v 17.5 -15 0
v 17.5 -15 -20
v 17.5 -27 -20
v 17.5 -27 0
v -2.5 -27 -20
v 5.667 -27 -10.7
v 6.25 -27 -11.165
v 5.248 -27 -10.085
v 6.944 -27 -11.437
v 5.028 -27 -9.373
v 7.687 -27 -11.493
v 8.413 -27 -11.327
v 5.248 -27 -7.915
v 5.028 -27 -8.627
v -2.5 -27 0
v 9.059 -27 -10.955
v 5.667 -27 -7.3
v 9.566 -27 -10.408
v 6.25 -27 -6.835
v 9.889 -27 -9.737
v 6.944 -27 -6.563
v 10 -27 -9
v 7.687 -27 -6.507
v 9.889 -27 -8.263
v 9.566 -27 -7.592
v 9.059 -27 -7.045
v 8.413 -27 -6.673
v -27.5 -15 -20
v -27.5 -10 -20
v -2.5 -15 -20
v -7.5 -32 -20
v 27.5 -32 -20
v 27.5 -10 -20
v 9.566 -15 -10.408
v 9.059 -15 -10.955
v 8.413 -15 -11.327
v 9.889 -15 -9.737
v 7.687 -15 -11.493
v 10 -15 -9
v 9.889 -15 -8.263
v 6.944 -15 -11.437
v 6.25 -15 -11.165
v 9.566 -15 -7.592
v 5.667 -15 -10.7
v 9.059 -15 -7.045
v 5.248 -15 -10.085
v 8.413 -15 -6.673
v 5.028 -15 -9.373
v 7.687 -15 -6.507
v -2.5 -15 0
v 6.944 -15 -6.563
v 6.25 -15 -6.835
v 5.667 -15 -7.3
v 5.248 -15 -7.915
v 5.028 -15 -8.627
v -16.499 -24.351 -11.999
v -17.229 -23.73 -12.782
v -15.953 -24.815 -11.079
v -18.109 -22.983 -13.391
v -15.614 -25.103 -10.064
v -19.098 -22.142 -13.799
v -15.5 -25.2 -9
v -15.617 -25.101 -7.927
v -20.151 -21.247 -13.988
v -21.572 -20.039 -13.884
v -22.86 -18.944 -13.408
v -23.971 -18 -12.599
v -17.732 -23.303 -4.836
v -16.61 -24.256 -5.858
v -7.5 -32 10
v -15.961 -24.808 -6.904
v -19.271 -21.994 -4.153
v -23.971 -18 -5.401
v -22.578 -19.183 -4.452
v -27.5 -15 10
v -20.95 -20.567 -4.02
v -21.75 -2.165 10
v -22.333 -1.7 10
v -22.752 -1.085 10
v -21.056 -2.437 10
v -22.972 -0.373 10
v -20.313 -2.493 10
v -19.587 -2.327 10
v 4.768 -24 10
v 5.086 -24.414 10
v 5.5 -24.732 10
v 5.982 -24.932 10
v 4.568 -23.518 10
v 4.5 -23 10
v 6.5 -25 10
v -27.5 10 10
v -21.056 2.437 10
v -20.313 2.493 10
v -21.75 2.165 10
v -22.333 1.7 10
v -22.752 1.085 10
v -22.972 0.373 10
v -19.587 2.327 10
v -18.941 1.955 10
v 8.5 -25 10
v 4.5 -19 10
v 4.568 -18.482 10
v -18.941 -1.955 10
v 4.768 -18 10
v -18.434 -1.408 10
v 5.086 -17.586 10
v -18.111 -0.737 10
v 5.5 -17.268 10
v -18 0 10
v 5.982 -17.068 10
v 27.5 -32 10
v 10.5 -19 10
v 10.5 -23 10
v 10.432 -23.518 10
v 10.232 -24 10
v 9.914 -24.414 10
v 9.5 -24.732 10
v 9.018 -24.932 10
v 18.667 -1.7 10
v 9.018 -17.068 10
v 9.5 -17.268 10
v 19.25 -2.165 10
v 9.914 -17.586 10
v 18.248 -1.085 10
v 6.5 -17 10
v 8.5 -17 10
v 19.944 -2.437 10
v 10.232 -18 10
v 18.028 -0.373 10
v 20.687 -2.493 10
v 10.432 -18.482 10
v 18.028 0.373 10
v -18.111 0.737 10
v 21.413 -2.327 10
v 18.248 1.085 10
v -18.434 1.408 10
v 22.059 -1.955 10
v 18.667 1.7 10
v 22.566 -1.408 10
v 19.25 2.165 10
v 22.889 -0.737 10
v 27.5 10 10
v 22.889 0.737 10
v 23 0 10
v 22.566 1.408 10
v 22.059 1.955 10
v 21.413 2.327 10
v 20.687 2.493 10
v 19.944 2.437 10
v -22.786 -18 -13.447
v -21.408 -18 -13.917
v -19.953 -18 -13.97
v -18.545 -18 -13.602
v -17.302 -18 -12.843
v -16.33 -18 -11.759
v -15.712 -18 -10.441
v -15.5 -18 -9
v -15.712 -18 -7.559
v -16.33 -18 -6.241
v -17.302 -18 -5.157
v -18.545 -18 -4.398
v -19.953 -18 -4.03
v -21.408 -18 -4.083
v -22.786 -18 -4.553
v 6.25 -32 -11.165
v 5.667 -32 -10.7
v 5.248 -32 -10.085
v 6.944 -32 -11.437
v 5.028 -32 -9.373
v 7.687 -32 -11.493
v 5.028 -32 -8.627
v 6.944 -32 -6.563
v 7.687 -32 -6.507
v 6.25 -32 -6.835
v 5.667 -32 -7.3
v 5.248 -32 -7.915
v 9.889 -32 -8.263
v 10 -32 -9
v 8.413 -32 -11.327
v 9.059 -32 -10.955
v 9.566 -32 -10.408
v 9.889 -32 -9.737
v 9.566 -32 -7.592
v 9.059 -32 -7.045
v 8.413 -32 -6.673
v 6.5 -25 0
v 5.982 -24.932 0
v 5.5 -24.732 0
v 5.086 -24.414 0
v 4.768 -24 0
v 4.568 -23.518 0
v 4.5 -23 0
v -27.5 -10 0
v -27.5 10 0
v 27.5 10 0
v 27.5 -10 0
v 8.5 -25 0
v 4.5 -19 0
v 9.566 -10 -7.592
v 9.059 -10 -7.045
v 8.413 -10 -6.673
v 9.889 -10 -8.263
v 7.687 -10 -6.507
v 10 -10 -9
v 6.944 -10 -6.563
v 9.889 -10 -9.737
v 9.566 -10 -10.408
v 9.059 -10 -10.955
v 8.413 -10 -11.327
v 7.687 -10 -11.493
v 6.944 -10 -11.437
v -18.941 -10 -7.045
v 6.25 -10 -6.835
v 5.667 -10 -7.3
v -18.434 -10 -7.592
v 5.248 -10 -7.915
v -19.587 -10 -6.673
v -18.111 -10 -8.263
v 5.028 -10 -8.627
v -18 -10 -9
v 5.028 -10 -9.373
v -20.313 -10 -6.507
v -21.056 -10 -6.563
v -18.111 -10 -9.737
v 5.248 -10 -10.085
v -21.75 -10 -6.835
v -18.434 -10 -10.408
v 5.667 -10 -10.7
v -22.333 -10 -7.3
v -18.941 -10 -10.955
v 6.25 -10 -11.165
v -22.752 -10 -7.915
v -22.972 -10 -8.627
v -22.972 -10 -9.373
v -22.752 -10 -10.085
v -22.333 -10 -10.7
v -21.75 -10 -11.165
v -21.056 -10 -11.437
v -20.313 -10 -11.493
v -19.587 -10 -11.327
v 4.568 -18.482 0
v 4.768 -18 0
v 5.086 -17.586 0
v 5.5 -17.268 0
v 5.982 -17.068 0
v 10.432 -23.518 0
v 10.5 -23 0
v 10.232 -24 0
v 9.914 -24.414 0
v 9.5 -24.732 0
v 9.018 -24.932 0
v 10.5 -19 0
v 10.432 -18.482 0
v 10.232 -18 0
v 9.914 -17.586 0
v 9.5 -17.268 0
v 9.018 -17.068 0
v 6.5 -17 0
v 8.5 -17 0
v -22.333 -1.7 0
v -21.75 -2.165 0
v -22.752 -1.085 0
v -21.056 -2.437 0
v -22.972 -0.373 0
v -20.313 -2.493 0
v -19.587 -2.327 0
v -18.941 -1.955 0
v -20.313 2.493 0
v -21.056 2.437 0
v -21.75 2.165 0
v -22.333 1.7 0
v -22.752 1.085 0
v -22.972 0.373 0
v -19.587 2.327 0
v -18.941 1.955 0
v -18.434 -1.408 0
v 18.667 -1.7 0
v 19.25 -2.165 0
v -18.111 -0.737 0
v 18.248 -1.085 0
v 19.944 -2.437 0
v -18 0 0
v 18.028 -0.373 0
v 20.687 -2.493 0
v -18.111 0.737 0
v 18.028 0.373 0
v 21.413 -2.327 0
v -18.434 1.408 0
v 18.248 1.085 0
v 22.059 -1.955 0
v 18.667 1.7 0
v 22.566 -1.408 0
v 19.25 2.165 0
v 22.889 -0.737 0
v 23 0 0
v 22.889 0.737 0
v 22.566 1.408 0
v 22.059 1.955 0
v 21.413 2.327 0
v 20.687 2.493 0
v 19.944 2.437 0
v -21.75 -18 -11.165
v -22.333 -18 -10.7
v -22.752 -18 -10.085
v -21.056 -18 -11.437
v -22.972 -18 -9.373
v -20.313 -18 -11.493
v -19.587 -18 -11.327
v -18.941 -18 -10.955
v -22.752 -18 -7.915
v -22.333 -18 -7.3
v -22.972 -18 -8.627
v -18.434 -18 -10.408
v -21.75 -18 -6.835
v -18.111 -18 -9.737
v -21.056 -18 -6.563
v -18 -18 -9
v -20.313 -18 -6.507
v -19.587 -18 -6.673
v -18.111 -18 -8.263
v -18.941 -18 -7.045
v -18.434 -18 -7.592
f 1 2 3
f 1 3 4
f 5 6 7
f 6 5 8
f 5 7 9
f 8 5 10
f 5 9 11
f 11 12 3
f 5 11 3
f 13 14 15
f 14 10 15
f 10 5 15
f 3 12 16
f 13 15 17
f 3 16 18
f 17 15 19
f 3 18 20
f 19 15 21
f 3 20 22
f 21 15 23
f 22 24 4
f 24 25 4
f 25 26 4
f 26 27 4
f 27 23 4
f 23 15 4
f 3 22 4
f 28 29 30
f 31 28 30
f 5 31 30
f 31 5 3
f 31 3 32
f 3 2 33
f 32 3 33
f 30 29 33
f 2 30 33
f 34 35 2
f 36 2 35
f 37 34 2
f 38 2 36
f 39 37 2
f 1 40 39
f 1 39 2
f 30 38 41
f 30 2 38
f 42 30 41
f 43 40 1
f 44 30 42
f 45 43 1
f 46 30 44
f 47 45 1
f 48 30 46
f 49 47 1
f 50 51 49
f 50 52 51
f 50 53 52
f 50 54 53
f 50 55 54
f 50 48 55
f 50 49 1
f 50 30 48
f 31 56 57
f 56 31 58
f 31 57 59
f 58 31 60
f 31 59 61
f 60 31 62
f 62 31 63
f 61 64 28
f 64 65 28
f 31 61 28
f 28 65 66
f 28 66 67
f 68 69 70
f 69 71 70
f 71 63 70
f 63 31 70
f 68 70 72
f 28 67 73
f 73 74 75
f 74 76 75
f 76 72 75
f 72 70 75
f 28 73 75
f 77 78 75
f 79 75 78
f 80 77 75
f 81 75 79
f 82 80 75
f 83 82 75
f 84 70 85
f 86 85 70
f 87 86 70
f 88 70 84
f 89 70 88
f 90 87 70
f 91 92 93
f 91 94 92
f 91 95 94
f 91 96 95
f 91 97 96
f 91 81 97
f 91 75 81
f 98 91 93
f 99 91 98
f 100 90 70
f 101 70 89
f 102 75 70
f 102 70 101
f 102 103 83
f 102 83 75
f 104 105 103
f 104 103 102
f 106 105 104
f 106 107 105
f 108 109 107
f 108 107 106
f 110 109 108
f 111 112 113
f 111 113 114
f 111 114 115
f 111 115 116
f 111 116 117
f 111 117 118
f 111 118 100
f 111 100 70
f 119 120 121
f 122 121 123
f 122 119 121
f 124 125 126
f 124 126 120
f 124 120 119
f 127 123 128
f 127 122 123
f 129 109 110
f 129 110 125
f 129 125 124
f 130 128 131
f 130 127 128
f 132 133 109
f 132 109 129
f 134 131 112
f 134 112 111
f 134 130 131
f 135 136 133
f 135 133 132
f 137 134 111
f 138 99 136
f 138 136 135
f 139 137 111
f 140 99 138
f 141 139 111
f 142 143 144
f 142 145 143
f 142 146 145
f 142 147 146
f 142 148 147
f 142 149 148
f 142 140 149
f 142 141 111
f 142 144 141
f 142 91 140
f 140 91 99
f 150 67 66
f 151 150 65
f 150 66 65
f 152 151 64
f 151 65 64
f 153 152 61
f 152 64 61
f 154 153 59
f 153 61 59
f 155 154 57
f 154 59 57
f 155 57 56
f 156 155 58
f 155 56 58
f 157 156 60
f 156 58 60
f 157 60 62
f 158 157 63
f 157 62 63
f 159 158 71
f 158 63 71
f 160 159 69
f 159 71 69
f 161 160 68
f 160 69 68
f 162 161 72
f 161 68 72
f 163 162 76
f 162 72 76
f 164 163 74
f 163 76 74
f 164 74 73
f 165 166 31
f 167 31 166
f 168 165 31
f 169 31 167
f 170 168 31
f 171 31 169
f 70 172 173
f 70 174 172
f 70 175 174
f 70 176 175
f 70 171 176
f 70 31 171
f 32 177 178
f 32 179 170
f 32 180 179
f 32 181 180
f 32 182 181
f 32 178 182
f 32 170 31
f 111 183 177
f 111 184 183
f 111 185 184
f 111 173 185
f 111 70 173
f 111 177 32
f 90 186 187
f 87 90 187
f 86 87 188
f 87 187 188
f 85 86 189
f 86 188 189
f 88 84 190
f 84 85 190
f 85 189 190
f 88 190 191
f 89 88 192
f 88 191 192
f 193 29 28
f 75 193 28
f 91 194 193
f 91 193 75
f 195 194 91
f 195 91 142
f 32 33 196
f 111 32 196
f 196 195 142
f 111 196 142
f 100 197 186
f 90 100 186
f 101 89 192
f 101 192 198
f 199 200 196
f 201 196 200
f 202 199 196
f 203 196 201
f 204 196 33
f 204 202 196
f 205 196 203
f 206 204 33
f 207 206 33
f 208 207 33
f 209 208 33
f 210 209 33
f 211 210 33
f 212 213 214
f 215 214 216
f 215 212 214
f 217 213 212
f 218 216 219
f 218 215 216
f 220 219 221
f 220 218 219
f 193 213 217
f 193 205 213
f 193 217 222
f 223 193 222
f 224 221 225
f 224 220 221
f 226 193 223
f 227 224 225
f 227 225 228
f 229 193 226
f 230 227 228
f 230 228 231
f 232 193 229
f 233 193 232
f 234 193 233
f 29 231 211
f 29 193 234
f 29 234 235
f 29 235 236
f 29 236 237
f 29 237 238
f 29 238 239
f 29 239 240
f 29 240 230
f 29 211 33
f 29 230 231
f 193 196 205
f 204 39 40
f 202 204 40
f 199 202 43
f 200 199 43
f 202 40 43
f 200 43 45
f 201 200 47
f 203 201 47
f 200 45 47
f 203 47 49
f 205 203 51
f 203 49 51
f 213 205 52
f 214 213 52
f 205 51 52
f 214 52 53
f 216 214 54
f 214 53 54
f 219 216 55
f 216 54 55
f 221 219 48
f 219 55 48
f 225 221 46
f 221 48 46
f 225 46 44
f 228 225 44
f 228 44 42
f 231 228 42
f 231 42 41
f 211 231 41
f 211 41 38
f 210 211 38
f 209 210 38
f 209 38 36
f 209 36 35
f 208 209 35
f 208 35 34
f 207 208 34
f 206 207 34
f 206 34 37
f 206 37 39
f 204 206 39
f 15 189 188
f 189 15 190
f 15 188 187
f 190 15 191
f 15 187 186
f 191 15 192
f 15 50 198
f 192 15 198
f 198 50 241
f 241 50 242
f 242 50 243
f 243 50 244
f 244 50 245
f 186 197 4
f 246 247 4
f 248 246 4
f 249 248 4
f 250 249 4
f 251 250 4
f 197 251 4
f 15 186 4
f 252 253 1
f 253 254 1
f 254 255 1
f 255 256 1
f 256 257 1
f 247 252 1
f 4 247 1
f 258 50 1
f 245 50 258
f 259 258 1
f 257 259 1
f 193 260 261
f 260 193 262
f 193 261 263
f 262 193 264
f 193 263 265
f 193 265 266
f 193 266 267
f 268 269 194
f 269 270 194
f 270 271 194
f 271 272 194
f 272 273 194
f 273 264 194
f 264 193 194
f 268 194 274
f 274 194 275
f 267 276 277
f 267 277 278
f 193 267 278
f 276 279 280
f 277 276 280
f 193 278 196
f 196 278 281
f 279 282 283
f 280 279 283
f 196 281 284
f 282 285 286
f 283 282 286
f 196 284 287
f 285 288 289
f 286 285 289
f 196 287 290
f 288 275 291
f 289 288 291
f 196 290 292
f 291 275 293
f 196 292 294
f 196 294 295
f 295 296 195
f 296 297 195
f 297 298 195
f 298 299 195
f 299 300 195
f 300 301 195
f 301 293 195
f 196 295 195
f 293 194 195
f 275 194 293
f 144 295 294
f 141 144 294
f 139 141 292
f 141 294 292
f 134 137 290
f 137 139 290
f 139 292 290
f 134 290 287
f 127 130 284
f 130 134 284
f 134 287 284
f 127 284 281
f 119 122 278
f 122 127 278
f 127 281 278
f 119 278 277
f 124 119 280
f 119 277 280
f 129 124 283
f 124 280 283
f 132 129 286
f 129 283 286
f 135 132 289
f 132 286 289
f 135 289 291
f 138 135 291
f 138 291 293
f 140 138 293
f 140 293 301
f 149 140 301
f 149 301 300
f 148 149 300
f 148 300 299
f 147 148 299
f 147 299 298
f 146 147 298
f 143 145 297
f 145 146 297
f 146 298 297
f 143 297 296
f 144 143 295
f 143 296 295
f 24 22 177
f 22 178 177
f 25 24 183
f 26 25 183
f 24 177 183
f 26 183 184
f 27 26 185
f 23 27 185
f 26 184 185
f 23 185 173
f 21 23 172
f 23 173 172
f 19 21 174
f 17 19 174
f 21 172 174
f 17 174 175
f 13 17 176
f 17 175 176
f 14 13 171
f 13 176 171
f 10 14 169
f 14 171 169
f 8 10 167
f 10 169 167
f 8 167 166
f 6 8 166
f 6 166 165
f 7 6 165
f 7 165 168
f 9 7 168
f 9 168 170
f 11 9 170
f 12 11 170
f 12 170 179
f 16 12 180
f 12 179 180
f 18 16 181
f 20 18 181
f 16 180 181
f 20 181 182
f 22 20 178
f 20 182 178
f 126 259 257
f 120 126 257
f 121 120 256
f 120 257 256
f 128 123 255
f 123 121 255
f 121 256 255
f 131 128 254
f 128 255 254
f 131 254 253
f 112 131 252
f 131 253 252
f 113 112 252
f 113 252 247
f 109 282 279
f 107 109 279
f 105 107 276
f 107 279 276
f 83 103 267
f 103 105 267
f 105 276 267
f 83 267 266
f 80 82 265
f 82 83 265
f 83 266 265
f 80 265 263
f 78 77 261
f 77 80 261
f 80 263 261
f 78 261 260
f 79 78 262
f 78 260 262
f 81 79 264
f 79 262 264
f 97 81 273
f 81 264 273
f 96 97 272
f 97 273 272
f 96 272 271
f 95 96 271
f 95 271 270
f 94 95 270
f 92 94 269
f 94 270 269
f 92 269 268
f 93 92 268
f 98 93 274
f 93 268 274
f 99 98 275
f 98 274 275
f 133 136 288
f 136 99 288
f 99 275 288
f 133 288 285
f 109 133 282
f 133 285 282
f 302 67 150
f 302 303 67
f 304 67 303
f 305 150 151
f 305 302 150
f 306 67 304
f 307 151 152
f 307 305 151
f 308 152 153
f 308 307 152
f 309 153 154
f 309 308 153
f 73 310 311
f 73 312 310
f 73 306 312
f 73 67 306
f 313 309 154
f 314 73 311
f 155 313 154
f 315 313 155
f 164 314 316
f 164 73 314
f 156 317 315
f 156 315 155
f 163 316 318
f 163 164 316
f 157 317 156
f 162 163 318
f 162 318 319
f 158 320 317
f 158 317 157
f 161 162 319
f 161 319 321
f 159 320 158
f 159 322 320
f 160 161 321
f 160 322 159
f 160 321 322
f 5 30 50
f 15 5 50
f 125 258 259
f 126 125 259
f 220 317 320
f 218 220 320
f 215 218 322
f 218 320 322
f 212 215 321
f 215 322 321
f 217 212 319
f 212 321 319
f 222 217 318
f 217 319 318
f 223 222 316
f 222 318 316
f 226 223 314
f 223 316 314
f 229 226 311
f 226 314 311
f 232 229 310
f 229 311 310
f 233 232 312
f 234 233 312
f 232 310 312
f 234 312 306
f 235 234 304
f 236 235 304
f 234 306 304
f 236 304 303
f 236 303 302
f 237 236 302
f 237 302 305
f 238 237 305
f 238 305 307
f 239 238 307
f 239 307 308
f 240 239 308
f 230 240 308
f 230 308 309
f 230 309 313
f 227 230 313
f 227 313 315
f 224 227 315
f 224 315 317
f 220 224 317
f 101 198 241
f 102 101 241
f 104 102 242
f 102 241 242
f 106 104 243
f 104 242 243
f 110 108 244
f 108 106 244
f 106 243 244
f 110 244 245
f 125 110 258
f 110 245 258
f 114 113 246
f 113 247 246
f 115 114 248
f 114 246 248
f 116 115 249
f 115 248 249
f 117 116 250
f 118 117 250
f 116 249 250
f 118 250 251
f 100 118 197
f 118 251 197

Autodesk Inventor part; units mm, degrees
ref_plane "YZ Plane" through (0, 0, 0) normal (1, 0, 0) x (0, 1, 0)
ref_plane "XZ Plane" through (0, 0, 0) normal (0, 1, 0) x (-1, 0, 0)
ref_plane "XY Plane" through (0, 0, 0) normal (0, 0, 1) x (1, 0, 0)
sketch "Boceto1" plane through (0, 0, 0) normal (0, 0, 1) x (1, 0, 0)
  line L0 (-27.5, 10) -> (27.5, 10)
  line L1 (27.5, 10) -> (27.5, -10)
  line L2 (27.5, -10) -> (-27.5, -10)
  line L3 (-27.5, -10) -> (-27.5, 10)
  line L4 (0, 0) -> (0, 1.7227)
  line L5 (0, 0) -> (-2.1619, 0)
  line L6 (27.5, -10) -> (-2.5, -10)
  line L7 (-2.5, -10) -> (-2.5, -27)
  line L8 (-2.5, -27) -> (27.5, -27)
  line L9 (27.5, -27) -> (27.5, -10)
  circle A0 centre (20.5, 0) radius 2.5
  circle A1 centre (-20.5, 0) radius 2.5
  point P0 (-2.5, -10)
  dimension "d14" = 55
  dimension "d15" = 20
  dimension "d16" = 30
  dimension "d17" = 17
  dimension "d18" = 5
  dimension "d19" = 5
  dimension "d20" = 7
  dimension "d21" = 7
extrude "Extrusión1" add sketch "Boceto1" along normal blind 10
sketch "Boceto2" plane through (-2.5, -27, 0) normal (0, -1, 0) x (1, 0, 0)
  line L0 (30, 10) -> (-25, 10) projected
  line L1 (30, 10) -> (0, 10)
  line L2 (0, 10) -> (0, -20)
  line L3 (0, -20) -> (30, -20)
  line L4 (30, -20) -> (30, 10)
  line L5 (0, 0) -> (0, 10) projected
  point P0 (2.5, 0)
  point P1 (0, 10)
  dimension "d22" = 30
extrude "Extrusión2" add sketch "Boceto2" along normal blind 5
sketch "Boceto4" plane through (-27.5, -10, 0) normal (-1, 0, 0) x (0, 0, 1)
  line L0 (0, 0) -> (0, -17) projected
  line L1 (10, 20) -> (10, 0) projected
  line L2 (10, 0) -> (-20, 0)
  line L3 (-20, 0) -> (-20, -5)
  line L4 (-20, -5) -> (10, -5)
  line L5 (10, -5) -> (10, 0)
  line L6 (10, -22) -> (-20, -22) projected
  point P0 (0, 10)
  dimension "d32" = 5
  dimension "d43" = 30
  dimension "d44" = 30
extrude "Extrusión4" add sketch "Boceto4" against normal up to surface (55 mm away)
sketch "Boceto5" plane through (-2.5, -32, 0) normal (0, -1, 0) x (1, 0, 0)
  circle A0 centre (10, -9) radius 2.5
  line L0 (30, -20) -> (30, 10) projected
  line L1 (0, -20) -> (30, -20) projected
  line L2 (-25, -20) -> (30, -20) projected
  line L3 (-25, -20) -> (-25, 10) projected
  line L4 (-25, 0) -> (30, 0) projected
  point P0 (2.5, 0)
  point P1 (0, 0)
  dimension "d33" = 5
  dimension "d34" = 20
  dimension "d41" = 9
extrude "Extrusión5" cut sketch "Boceto5" against normal up to surface (22 mm away) contours A0
sketch "Boceto8" plane through (-27.5, -15, -20) normal (0, -1, 0) x (1, 0, 0)
  line L0 (0, 30) -> (25, 30) projected
  line L1 (0, 0) -> (55, 0) projected
  line L2 (25, 30) -> (20, 30)
  line L3 (20, 30) -> (20, 0)
  line L4 (20, 0) -> (25, 0)
  line L5 (25, 0) -> (25, 30)
  line L6 (25, 20) -> (55, 20) projected
  line L7 (45, 20) -> (55, 20)
  line L8 (55, 20) -> (55, 0)
  line L9 (55, 0) -> (45, 0)
  line L10 (45, 0) -> (45, 20)
  line L11 (55, 0) -> (55, 20) projected
  point P0 (27.5, 20)
  point P1 (45, 0)
  point P2 (25, 0)
  point P3 (20, 30)
  dimension "d54" = 5
  dimension "d56" = 0
  dimension "d69" = 10
extrude "Extrusión8" add sketch "Boceto8" along normal up to surface (17 mm away) contours L0 L5 L1 L3 | L6 L8 L1 L10
sketch "Boceto9" plane through (0, 0, 10) normal (0, 0, 1) x (1, 0, 0)
  line L0 (27.5, -32) -> (-7.5, -32) projected
  line L1 (-27.5, 10) -> (-27.5, -15) projected
  line L2 (-7.5, -32) -> (-27.5, -15)
  line L3 (-27.5, -15) -> (-7.5, -15) projected
  line L4 (-7.5, -15) -> (-7.5, -32) projected
  point P0 (0, 0)
extrude "Extrusión9" add sketch "Boceto9" against normal up to surface (30 mm away)
sketch "Boceto10" plane through (-2.5, -32, 0) normal (0, -1, 0) x (1, 0, 0)
  circle A0 centre (-18, -9) radius 2.5
  line L0 (-25, 10) -> (-5, 10) projected
  line L1 (-25, -20) -> (-25, 10) projected
  point P0 (2.5, 0)
  dimension "d61" = 5
  dimension "d62" = 19
  dimension "d63" = 7
extrude "Extrusión10" cut sketch "Boceto10" against normal up to surface (22 mm away)
sketch "Boceto11" plane through (-2.5, -32, 0) normal (0, -1, 0) x (1, 0, 0)
  circle A0 centre (-18, -9) radius 2.5 projected
  circle A1 centre (-18, -9) radius 5
  point P0 (2.5, 0)
  dimension "d66" = 10
extrude "Extrusión11" cut sketch "Boceto11" against normal blind 14 contours A0 | A1
sketch "Boceto12" plane through (0, 0, 10) normal (0, 0, 1) x (1, 0, 0)
  line L0 (7.5, -25) -> (4.5, -25)
  line L1 (4.5, -25) -> (4.5, -17)
  line L2 (4.5, -17) -> (7.5, -17)
  line L3 (7.5, -17) -> (7.5, -25)
  line L4 (7.5, -17) -> (10.5, -17)
  line L5 (10.5, -17) -> (10.5, -25)
  line L6 (7.5, -25) -> (7.5, -17)
  line L7 (27.5, -32) -> (-7.5, -32) projected
  line L8 (7.5, -25) -> (10.5, -25)
  line L9 (-27.5, -10) -> (27.5, -10) projected
  point P0 (0, 0)
  dimension "d70" = 3
  dimension "d72" = 3
  dimension "d77" = 7
  dimension "d78" = 8
extrude "Extrusión12" cut sketch "Boceto12" against normal up to surface (10 mm away)
fillet "Empalme4" radius 2 4 edges at (10.5, -17, 5) (4.5, -17, 5) (10.5, -25, 5) (4.5, -25, 5)
equation "\"d19\" = d18"
equation "\"d20\" = d21"
equation "\"d44\" = d43"
equation "\"d72\" = d70"
properties part number "Soporte Idler Z" material "Hormigón reforzado con fibra de vidrio"
